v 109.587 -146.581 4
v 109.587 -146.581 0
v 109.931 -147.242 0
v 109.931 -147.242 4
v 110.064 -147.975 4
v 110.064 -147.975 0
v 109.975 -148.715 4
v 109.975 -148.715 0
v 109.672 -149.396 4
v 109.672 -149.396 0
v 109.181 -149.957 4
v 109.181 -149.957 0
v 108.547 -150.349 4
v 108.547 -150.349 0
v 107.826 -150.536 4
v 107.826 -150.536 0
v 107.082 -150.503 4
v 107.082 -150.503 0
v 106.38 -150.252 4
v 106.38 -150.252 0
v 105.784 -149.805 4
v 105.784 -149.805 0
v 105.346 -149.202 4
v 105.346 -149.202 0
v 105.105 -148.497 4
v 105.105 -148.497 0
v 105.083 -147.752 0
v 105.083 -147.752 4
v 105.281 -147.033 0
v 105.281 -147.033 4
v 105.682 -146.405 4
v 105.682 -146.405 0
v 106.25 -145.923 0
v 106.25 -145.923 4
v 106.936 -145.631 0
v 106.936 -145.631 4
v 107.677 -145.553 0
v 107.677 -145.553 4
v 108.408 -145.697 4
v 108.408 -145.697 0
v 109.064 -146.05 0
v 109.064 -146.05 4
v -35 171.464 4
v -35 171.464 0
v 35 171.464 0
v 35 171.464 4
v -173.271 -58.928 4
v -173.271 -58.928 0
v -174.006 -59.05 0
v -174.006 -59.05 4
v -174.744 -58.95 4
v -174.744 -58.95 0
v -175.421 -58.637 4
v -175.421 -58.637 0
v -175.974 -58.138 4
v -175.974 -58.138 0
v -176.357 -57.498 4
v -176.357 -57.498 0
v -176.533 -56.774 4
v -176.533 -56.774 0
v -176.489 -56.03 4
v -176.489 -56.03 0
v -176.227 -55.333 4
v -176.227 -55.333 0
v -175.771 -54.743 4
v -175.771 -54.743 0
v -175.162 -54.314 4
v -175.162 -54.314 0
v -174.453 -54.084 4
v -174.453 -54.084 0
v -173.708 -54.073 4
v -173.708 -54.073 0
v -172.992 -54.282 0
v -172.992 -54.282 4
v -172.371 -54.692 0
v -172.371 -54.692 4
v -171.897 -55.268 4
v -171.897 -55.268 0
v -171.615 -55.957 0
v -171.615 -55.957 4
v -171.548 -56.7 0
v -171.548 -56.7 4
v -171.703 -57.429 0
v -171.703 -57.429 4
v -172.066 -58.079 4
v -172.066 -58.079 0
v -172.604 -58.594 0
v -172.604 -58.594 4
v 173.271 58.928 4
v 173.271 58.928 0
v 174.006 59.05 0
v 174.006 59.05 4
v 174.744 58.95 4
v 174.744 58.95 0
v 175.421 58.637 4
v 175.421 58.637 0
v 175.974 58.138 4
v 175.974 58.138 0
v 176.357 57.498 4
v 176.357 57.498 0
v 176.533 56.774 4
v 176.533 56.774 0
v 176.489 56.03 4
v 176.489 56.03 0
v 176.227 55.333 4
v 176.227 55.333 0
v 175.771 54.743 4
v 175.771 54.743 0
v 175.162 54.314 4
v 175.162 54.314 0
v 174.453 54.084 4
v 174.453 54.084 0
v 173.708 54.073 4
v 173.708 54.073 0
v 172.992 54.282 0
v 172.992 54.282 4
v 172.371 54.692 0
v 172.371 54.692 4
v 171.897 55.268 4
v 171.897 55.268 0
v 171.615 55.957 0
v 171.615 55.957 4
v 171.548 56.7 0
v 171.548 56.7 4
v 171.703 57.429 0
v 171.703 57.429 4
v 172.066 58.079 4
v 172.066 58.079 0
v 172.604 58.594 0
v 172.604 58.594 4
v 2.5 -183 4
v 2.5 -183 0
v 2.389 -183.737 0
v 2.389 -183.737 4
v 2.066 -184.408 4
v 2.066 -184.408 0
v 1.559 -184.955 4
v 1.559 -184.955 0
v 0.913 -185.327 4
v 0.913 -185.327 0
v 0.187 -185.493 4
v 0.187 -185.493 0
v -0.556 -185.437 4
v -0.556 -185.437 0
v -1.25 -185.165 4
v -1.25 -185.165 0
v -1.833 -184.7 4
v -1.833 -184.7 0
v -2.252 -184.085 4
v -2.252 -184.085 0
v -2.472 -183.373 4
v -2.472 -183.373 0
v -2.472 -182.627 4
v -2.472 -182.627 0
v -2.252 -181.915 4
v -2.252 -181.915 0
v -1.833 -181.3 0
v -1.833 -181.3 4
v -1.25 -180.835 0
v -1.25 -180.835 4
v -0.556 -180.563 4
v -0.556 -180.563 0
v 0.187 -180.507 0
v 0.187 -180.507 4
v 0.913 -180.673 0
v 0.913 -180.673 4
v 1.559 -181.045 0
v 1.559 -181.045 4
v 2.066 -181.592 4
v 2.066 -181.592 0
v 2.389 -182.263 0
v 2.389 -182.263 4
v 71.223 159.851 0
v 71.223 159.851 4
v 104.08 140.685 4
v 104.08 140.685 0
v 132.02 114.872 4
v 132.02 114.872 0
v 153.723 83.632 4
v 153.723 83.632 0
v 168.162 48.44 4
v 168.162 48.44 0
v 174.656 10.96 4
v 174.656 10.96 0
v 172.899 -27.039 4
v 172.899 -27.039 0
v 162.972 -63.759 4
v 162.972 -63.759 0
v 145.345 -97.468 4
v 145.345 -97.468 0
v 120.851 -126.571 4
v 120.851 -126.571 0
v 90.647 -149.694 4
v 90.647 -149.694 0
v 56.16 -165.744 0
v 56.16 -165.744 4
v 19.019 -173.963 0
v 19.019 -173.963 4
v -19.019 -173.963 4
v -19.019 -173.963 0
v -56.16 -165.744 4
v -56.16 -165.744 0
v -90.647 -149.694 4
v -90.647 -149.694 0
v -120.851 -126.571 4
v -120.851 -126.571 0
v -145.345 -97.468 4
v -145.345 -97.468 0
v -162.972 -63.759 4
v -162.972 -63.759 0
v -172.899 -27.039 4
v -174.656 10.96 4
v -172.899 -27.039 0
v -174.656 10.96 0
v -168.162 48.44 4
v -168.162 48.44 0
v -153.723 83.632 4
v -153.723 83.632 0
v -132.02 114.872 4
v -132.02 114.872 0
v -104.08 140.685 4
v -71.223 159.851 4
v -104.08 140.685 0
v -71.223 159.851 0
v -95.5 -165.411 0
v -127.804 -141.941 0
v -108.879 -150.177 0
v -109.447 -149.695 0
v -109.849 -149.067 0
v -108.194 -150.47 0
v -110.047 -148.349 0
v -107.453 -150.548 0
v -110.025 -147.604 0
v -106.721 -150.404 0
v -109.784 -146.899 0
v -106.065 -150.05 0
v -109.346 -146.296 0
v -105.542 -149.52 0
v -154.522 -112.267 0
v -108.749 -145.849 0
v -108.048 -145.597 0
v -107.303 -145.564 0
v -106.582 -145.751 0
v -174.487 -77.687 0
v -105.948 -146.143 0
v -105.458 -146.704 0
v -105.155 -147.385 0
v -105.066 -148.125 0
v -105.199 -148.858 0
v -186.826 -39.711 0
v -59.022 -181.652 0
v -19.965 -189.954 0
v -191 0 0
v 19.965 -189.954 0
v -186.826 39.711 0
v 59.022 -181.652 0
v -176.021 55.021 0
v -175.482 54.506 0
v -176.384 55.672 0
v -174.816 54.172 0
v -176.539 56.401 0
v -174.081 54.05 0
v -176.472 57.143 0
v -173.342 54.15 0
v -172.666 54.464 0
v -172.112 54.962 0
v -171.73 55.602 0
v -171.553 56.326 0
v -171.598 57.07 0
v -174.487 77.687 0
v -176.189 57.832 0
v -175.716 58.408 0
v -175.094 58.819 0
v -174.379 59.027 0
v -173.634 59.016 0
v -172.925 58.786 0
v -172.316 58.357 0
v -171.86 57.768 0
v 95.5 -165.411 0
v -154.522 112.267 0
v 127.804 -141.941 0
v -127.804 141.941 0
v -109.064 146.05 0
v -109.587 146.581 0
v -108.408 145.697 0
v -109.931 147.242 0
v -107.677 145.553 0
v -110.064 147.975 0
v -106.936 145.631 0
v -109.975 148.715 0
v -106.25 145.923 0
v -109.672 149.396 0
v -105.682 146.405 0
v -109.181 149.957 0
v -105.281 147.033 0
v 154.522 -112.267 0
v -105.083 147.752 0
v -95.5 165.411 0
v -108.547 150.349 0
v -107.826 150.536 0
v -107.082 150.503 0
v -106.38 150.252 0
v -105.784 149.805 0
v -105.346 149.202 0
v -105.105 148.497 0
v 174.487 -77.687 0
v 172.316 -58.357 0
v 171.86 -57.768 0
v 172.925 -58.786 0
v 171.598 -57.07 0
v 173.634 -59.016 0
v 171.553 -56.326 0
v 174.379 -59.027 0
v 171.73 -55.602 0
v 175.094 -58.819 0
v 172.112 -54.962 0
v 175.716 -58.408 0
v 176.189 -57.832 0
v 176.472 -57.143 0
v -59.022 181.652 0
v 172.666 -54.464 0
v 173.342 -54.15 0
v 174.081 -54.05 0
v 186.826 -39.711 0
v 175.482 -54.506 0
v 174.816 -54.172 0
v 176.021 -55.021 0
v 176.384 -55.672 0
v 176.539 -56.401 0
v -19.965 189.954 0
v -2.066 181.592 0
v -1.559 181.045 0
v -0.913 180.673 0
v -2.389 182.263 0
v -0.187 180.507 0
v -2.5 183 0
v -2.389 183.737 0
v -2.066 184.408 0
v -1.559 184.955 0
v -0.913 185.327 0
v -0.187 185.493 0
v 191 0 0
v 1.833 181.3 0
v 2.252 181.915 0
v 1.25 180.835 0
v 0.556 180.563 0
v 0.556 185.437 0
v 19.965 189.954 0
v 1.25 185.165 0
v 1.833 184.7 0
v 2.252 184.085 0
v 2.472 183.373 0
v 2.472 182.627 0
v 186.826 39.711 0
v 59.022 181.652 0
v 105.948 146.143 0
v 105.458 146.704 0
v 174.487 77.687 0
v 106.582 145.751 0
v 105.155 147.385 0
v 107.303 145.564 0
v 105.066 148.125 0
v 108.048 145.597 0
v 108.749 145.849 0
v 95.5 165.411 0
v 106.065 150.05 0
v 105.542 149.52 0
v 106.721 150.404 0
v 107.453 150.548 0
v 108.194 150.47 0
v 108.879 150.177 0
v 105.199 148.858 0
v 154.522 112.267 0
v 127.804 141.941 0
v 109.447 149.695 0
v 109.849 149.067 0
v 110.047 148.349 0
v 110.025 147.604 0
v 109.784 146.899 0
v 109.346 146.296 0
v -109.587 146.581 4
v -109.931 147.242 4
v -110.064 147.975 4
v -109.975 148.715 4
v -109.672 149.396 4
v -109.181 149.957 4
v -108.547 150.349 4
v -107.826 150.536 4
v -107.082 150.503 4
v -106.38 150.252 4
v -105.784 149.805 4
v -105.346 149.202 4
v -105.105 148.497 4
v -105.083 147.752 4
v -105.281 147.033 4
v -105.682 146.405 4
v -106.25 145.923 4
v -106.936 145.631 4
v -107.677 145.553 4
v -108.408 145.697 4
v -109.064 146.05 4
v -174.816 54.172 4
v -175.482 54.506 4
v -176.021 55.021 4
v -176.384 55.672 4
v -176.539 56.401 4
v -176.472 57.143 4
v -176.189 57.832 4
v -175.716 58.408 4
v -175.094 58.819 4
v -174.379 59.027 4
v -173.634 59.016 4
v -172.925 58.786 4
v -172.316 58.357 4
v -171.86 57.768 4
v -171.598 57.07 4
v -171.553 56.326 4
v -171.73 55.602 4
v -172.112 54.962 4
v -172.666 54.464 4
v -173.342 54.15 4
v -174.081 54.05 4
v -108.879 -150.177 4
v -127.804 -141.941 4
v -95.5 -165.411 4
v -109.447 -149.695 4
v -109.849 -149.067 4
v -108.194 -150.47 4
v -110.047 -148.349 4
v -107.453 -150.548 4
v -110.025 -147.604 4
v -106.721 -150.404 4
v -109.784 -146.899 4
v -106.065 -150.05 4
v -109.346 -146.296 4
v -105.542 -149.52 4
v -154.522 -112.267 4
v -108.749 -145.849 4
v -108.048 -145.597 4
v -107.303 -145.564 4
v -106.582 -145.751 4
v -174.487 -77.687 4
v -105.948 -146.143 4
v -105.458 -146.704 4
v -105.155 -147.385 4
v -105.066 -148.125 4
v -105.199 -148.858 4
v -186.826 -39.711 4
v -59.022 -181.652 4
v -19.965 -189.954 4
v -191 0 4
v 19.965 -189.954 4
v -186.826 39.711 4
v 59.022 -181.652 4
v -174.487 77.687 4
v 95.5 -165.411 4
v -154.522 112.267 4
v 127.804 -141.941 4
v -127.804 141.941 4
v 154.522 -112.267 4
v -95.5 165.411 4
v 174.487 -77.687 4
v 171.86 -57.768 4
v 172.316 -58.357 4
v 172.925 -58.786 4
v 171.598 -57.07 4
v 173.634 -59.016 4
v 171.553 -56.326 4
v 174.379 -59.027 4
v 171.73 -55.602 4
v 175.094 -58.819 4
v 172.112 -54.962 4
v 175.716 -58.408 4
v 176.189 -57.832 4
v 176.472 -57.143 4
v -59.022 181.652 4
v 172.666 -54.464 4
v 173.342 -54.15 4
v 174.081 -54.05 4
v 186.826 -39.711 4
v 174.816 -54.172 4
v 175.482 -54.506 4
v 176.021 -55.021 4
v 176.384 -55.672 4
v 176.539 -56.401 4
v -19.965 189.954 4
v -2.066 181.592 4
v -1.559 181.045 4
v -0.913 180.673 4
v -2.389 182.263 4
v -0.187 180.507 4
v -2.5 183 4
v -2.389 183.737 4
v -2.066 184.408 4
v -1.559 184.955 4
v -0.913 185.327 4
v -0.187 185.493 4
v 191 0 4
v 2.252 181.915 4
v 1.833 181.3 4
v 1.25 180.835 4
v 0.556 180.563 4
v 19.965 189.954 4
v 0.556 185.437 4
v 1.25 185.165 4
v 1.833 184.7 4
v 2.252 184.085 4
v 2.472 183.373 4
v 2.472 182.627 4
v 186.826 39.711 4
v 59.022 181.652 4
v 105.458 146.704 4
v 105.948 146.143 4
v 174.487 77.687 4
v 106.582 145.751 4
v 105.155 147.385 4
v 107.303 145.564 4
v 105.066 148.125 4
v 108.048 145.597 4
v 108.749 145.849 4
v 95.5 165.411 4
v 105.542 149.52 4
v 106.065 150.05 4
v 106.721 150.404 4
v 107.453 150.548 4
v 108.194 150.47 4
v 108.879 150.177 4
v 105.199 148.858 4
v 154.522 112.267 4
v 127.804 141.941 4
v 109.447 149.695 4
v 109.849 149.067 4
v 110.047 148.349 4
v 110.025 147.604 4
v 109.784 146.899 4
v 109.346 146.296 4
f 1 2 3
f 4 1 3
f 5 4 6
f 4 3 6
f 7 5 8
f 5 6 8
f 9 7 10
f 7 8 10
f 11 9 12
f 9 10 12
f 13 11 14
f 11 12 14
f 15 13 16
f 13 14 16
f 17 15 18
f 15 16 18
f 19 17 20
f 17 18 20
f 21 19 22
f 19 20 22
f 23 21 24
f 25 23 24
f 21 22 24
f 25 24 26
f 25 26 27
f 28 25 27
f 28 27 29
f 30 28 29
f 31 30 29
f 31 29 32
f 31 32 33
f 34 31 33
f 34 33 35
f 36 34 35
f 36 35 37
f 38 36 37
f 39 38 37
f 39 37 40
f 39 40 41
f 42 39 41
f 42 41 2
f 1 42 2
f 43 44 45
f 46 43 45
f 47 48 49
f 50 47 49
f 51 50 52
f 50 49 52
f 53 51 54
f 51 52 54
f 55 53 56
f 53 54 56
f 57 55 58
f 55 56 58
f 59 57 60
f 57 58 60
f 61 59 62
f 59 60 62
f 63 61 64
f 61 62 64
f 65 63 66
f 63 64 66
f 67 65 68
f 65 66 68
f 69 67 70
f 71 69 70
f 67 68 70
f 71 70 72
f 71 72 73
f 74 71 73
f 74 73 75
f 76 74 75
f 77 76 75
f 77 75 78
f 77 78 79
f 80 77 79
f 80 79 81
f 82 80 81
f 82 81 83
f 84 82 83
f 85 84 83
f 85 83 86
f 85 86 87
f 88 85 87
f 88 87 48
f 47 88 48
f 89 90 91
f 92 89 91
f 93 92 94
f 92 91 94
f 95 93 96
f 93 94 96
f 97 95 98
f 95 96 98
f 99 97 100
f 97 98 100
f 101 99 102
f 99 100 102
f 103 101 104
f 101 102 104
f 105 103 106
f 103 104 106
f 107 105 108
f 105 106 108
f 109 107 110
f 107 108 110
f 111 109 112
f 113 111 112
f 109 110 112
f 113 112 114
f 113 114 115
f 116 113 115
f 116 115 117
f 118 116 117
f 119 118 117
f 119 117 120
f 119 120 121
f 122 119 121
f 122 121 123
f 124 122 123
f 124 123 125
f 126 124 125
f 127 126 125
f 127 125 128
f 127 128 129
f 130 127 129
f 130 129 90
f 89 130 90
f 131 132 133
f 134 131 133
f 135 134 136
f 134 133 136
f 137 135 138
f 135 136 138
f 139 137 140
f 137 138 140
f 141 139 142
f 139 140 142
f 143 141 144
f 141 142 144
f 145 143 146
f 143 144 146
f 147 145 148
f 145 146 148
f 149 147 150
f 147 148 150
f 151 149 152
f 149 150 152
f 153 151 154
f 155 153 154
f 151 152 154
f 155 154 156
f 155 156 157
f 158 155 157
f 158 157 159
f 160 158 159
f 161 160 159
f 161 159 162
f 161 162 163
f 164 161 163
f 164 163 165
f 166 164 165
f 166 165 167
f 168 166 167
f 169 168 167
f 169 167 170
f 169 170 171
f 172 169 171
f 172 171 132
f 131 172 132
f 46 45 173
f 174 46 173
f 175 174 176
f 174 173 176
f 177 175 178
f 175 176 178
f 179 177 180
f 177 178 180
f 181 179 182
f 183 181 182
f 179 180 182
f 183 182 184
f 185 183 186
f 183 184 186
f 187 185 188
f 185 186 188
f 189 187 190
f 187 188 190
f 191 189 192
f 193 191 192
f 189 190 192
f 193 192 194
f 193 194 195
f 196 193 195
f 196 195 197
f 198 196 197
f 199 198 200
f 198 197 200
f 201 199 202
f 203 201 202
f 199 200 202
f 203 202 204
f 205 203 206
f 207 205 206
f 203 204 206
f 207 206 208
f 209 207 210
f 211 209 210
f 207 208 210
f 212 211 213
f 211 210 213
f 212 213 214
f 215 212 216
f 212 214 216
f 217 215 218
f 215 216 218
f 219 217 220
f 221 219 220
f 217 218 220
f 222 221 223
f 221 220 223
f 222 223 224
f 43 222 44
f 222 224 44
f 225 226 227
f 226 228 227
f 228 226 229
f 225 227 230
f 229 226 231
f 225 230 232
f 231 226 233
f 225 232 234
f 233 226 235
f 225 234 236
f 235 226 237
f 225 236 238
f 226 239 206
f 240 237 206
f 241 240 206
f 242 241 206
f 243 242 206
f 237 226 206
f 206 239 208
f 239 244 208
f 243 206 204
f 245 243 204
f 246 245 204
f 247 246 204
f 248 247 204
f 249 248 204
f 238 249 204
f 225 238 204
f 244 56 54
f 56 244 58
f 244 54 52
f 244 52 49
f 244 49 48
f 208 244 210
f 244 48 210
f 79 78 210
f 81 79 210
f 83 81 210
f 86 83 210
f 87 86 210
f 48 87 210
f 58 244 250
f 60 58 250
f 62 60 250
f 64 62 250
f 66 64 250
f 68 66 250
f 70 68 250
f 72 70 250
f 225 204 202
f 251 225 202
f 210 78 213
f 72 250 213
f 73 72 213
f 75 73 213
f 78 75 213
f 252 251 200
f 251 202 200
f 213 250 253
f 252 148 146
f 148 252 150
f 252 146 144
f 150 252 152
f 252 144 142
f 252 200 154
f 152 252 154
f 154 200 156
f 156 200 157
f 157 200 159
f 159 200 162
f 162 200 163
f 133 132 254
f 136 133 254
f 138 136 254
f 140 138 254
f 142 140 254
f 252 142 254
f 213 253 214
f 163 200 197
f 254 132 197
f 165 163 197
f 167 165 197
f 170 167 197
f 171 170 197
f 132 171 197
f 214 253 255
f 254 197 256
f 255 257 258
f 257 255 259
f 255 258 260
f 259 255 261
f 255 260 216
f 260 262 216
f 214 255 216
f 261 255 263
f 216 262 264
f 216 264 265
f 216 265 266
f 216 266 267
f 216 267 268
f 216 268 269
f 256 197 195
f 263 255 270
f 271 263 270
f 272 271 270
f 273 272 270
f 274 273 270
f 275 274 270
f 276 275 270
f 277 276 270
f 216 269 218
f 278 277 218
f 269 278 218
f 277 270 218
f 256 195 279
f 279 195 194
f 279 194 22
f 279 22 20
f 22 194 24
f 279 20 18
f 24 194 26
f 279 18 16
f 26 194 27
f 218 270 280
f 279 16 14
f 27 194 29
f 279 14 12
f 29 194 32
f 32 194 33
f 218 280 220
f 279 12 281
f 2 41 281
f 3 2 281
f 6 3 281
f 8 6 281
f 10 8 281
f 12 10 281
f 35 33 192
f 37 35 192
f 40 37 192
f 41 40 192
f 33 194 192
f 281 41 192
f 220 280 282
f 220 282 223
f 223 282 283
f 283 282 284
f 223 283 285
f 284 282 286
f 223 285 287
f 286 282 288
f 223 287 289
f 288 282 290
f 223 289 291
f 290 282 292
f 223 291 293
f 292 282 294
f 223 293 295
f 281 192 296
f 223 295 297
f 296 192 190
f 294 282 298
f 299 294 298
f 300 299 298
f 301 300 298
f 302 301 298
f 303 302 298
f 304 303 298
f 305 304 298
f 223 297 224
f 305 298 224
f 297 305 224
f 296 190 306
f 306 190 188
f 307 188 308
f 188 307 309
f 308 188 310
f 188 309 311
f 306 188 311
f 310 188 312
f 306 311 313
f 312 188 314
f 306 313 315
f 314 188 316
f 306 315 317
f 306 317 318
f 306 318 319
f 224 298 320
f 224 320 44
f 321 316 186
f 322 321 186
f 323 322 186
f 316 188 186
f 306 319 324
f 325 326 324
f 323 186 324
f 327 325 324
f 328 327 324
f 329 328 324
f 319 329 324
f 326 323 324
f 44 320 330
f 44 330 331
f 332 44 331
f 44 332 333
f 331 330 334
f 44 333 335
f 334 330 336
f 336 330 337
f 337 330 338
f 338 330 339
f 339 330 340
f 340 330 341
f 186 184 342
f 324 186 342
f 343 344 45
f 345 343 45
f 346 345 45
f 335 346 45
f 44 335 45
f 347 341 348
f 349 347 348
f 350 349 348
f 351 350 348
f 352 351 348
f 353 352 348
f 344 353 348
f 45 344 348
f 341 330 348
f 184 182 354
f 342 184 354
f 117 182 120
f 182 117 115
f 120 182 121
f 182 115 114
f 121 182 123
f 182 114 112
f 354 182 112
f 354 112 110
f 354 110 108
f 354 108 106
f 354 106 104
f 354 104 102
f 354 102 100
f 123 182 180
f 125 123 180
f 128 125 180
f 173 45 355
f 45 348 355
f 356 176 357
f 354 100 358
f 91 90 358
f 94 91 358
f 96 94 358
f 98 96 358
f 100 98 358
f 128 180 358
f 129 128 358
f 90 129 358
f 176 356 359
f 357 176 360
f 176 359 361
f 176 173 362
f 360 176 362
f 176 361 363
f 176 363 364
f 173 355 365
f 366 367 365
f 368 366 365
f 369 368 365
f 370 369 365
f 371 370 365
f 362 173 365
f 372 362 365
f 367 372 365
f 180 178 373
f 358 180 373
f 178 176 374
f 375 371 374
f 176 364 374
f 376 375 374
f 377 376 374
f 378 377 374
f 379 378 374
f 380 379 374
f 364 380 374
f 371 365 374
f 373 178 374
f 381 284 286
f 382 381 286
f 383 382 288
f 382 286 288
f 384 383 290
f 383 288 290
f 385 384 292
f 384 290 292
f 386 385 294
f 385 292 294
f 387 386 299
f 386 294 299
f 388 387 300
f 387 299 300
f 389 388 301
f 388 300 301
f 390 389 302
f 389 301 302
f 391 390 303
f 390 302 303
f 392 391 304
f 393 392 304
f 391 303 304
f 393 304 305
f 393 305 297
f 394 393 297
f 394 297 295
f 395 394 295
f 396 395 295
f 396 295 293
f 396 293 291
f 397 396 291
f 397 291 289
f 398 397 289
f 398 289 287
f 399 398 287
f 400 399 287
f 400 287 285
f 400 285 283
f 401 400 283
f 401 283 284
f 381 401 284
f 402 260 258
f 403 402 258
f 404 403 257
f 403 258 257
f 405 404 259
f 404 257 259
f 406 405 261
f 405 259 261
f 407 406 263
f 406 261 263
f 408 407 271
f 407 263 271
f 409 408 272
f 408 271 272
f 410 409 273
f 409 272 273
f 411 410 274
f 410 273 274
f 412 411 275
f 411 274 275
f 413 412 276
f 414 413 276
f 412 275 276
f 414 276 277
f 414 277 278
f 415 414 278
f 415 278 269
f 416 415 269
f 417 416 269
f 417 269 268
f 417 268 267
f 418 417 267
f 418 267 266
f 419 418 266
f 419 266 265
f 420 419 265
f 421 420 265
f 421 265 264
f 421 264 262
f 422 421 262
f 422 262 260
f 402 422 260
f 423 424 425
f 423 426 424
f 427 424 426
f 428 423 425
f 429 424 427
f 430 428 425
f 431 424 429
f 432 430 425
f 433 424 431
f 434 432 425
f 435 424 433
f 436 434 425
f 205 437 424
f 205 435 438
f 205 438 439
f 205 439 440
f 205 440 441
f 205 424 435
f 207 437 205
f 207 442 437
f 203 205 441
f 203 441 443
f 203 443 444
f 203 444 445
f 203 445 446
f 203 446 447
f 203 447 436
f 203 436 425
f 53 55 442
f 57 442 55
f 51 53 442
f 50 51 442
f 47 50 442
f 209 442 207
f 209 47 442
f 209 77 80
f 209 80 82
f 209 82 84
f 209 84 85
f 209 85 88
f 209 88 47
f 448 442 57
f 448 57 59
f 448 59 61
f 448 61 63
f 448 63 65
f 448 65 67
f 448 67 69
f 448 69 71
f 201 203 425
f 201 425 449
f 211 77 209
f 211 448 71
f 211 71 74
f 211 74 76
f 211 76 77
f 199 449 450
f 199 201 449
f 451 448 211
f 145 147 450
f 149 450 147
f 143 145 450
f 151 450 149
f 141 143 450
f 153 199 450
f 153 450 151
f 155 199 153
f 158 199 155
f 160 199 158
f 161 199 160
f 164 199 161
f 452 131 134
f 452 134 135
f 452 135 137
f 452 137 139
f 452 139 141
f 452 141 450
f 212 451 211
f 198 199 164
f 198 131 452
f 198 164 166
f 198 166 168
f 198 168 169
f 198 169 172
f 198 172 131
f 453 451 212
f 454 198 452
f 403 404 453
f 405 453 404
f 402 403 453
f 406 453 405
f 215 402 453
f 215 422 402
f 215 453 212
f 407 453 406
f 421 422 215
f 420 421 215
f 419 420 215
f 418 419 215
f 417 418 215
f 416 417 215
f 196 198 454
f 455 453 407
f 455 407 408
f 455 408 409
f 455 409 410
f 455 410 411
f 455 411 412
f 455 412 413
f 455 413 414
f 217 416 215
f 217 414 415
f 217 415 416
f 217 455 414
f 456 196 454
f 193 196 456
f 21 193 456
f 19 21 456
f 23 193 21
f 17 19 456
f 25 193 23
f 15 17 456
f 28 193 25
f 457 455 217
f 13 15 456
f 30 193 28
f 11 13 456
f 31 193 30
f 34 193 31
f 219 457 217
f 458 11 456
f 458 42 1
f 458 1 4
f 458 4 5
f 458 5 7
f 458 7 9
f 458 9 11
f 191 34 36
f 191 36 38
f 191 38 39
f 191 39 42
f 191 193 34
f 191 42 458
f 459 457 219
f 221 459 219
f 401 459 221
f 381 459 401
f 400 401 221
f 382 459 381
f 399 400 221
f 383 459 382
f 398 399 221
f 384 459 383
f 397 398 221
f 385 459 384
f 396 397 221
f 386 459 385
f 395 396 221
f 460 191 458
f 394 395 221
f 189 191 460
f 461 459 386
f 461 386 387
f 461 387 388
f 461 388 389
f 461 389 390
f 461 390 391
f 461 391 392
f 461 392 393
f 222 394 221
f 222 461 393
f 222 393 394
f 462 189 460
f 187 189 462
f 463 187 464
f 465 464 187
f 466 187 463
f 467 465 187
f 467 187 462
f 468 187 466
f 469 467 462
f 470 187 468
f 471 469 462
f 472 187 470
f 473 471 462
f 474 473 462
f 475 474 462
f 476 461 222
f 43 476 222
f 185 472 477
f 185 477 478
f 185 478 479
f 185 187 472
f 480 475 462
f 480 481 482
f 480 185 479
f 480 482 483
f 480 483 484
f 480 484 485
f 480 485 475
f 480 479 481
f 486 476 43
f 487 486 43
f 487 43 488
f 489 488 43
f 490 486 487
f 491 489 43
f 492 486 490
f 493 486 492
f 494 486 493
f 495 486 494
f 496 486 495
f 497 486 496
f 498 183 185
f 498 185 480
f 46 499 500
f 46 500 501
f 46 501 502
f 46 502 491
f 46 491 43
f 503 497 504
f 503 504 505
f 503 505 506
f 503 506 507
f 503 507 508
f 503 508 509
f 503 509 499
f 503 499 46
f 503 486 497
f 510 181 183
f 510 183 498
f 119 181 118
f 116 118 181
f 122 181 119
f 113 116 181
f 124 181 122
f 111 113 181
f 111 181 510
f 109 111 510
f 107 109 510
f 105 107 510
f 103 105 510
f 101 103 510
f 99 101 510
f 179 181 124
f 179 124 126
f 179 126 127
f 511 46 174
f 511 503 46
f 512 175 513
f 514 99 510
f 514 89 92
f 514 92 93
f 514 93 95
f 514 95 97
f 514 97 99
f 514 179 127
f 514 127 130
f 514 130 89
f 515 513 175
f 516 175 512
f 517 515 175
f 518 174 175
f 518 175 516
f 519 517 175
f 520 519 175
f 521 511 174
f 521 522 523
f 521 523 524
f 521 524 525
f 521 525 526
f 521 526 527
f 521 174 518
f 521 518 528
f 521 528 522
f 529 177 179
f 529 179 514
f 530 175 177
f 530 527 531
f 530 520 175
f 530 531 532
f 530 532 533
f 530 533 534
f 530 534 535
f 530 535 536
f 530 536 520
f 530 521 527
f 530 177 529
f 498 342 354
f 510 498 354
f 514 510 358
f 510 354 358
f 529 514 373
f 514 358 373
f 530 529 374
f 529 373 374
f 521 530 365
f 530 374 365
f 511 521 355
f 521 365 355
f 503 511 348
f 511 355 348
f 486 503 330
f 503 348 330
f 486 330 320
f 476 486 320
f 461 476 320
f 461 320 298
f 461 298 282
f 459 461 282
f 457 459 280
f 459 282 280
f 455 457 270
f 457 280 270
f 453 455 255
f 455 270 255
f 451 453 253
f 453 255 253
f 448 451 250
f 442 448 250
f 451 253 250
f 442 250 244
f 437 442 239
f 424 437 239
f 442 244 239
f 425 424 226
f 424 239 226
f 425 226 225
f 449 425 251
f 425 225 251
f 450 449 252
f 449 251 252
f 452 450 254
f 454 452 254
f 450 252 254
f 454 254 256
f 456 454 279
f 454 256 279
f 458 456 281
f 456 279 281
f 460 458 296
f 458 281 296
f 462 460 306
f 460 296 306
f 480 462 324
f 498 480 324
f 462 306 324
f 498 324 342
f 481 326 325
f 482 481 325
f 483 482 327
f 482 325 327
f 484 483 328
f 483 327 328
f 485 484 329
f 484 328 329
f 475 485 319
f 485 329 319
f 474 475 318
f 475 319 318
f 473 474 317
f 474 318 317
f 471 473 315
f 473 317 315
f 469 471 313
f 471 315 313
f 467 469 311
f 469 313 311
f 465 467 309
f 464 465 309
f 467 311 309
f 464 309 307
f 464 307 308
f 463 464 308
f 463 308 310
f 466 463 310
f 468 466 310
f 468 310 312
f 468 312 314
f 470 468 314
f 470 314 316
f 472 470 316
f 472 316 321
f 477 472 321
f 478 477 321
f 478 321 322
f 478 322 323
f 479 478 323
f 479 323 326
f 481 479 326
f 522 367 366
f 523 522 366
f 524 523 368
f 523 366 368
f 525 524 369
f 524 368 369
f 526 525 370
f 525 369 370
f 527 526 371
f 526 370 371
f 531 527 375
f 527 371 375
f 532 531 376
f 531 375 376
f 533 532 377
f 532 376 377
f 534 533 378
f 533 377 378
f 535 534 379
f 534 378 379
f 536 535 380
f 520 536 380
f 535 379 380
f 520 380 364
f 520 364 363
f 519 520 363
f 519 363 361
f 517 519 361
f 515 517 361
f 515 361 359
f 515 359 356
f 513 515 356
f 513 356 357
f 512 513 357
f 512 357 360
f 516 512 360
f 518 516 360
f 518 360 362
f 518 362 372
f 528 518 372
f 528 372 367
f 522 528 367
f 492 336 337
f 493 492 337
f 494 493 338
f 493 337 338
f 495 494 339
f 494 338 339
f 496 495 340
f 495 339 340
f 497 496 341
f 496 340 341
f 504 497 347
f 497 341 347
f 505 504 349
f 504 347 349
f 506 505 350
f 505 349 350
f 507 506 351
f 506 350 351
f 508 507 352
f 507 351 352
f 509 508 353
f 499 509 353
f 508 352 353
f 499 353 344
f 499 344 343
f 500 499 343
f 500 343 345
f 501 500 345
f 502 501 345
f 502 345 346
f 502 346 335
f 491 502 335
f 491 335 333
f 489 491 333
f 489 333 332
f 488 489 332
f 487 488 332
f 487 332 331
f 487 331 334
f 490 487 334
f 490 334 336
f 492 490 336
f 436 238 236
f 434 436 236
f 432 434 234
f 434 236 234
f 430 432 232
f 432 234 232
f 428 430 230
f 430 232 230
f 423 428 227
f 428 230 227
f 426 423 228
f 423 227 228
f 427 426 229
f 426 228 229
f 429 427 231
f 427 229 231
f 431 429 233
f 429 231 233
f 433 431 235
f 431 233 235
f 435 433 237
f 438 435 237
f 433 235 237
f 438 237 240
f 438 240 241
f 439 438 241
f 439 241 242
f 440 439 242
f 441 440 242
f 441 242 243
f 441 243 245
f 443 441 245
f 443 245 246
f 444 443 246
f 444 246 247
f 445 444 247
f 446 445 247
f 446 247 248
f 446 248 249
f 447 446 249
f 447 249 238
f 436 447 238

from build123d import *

# Parameters (mm, degrees)
SKETCH1_R           = 191
BOSS_EXTRUDE1_DEPTH = 4
M6_TAPPED_HOLE1_D   = 5
CIRPATTERN1_COUNT   = 10


with BuildPart() as part:
    # Sketch1 → Boss-Extrude1 (new body)
    with BuildSketch(Plane.XY):
        Circle(SKETCH1_R)
        with BuildLine():
            Line((-35, 171.464281995), (35, 171.464281995))
            ThreePointArc((35, 171.464281995), (0, -175), (-35, 171.464281995))
        make_face(mode=Mode.SUBTRACT)
    extrude(amount=BOSS_EXTRUDE1_DEPTH)

    # M6 Tapped Hole1 (through all)
    with Locations(Plane.XY.offset(4)):
        with Locations((0, 183)):
            m6_tapped_hole1 = Hole(M6_TAPPED_HOLE1_D / 2)

    # CirPattern1: M6 Tapped Hole1 ×10 about axis
    cirpattern1_axis = Axis((0, 0, 0), (0, 0, 1))
    for i in range(1, CIRPATTERN1_COUNT):
        add(m6_tapped_hole1.rotate(cirpattern1_axis, i * 360 / CIRPATTERN1_COUNT), mode=Mode.SUBTRACT)


solid = part.part
